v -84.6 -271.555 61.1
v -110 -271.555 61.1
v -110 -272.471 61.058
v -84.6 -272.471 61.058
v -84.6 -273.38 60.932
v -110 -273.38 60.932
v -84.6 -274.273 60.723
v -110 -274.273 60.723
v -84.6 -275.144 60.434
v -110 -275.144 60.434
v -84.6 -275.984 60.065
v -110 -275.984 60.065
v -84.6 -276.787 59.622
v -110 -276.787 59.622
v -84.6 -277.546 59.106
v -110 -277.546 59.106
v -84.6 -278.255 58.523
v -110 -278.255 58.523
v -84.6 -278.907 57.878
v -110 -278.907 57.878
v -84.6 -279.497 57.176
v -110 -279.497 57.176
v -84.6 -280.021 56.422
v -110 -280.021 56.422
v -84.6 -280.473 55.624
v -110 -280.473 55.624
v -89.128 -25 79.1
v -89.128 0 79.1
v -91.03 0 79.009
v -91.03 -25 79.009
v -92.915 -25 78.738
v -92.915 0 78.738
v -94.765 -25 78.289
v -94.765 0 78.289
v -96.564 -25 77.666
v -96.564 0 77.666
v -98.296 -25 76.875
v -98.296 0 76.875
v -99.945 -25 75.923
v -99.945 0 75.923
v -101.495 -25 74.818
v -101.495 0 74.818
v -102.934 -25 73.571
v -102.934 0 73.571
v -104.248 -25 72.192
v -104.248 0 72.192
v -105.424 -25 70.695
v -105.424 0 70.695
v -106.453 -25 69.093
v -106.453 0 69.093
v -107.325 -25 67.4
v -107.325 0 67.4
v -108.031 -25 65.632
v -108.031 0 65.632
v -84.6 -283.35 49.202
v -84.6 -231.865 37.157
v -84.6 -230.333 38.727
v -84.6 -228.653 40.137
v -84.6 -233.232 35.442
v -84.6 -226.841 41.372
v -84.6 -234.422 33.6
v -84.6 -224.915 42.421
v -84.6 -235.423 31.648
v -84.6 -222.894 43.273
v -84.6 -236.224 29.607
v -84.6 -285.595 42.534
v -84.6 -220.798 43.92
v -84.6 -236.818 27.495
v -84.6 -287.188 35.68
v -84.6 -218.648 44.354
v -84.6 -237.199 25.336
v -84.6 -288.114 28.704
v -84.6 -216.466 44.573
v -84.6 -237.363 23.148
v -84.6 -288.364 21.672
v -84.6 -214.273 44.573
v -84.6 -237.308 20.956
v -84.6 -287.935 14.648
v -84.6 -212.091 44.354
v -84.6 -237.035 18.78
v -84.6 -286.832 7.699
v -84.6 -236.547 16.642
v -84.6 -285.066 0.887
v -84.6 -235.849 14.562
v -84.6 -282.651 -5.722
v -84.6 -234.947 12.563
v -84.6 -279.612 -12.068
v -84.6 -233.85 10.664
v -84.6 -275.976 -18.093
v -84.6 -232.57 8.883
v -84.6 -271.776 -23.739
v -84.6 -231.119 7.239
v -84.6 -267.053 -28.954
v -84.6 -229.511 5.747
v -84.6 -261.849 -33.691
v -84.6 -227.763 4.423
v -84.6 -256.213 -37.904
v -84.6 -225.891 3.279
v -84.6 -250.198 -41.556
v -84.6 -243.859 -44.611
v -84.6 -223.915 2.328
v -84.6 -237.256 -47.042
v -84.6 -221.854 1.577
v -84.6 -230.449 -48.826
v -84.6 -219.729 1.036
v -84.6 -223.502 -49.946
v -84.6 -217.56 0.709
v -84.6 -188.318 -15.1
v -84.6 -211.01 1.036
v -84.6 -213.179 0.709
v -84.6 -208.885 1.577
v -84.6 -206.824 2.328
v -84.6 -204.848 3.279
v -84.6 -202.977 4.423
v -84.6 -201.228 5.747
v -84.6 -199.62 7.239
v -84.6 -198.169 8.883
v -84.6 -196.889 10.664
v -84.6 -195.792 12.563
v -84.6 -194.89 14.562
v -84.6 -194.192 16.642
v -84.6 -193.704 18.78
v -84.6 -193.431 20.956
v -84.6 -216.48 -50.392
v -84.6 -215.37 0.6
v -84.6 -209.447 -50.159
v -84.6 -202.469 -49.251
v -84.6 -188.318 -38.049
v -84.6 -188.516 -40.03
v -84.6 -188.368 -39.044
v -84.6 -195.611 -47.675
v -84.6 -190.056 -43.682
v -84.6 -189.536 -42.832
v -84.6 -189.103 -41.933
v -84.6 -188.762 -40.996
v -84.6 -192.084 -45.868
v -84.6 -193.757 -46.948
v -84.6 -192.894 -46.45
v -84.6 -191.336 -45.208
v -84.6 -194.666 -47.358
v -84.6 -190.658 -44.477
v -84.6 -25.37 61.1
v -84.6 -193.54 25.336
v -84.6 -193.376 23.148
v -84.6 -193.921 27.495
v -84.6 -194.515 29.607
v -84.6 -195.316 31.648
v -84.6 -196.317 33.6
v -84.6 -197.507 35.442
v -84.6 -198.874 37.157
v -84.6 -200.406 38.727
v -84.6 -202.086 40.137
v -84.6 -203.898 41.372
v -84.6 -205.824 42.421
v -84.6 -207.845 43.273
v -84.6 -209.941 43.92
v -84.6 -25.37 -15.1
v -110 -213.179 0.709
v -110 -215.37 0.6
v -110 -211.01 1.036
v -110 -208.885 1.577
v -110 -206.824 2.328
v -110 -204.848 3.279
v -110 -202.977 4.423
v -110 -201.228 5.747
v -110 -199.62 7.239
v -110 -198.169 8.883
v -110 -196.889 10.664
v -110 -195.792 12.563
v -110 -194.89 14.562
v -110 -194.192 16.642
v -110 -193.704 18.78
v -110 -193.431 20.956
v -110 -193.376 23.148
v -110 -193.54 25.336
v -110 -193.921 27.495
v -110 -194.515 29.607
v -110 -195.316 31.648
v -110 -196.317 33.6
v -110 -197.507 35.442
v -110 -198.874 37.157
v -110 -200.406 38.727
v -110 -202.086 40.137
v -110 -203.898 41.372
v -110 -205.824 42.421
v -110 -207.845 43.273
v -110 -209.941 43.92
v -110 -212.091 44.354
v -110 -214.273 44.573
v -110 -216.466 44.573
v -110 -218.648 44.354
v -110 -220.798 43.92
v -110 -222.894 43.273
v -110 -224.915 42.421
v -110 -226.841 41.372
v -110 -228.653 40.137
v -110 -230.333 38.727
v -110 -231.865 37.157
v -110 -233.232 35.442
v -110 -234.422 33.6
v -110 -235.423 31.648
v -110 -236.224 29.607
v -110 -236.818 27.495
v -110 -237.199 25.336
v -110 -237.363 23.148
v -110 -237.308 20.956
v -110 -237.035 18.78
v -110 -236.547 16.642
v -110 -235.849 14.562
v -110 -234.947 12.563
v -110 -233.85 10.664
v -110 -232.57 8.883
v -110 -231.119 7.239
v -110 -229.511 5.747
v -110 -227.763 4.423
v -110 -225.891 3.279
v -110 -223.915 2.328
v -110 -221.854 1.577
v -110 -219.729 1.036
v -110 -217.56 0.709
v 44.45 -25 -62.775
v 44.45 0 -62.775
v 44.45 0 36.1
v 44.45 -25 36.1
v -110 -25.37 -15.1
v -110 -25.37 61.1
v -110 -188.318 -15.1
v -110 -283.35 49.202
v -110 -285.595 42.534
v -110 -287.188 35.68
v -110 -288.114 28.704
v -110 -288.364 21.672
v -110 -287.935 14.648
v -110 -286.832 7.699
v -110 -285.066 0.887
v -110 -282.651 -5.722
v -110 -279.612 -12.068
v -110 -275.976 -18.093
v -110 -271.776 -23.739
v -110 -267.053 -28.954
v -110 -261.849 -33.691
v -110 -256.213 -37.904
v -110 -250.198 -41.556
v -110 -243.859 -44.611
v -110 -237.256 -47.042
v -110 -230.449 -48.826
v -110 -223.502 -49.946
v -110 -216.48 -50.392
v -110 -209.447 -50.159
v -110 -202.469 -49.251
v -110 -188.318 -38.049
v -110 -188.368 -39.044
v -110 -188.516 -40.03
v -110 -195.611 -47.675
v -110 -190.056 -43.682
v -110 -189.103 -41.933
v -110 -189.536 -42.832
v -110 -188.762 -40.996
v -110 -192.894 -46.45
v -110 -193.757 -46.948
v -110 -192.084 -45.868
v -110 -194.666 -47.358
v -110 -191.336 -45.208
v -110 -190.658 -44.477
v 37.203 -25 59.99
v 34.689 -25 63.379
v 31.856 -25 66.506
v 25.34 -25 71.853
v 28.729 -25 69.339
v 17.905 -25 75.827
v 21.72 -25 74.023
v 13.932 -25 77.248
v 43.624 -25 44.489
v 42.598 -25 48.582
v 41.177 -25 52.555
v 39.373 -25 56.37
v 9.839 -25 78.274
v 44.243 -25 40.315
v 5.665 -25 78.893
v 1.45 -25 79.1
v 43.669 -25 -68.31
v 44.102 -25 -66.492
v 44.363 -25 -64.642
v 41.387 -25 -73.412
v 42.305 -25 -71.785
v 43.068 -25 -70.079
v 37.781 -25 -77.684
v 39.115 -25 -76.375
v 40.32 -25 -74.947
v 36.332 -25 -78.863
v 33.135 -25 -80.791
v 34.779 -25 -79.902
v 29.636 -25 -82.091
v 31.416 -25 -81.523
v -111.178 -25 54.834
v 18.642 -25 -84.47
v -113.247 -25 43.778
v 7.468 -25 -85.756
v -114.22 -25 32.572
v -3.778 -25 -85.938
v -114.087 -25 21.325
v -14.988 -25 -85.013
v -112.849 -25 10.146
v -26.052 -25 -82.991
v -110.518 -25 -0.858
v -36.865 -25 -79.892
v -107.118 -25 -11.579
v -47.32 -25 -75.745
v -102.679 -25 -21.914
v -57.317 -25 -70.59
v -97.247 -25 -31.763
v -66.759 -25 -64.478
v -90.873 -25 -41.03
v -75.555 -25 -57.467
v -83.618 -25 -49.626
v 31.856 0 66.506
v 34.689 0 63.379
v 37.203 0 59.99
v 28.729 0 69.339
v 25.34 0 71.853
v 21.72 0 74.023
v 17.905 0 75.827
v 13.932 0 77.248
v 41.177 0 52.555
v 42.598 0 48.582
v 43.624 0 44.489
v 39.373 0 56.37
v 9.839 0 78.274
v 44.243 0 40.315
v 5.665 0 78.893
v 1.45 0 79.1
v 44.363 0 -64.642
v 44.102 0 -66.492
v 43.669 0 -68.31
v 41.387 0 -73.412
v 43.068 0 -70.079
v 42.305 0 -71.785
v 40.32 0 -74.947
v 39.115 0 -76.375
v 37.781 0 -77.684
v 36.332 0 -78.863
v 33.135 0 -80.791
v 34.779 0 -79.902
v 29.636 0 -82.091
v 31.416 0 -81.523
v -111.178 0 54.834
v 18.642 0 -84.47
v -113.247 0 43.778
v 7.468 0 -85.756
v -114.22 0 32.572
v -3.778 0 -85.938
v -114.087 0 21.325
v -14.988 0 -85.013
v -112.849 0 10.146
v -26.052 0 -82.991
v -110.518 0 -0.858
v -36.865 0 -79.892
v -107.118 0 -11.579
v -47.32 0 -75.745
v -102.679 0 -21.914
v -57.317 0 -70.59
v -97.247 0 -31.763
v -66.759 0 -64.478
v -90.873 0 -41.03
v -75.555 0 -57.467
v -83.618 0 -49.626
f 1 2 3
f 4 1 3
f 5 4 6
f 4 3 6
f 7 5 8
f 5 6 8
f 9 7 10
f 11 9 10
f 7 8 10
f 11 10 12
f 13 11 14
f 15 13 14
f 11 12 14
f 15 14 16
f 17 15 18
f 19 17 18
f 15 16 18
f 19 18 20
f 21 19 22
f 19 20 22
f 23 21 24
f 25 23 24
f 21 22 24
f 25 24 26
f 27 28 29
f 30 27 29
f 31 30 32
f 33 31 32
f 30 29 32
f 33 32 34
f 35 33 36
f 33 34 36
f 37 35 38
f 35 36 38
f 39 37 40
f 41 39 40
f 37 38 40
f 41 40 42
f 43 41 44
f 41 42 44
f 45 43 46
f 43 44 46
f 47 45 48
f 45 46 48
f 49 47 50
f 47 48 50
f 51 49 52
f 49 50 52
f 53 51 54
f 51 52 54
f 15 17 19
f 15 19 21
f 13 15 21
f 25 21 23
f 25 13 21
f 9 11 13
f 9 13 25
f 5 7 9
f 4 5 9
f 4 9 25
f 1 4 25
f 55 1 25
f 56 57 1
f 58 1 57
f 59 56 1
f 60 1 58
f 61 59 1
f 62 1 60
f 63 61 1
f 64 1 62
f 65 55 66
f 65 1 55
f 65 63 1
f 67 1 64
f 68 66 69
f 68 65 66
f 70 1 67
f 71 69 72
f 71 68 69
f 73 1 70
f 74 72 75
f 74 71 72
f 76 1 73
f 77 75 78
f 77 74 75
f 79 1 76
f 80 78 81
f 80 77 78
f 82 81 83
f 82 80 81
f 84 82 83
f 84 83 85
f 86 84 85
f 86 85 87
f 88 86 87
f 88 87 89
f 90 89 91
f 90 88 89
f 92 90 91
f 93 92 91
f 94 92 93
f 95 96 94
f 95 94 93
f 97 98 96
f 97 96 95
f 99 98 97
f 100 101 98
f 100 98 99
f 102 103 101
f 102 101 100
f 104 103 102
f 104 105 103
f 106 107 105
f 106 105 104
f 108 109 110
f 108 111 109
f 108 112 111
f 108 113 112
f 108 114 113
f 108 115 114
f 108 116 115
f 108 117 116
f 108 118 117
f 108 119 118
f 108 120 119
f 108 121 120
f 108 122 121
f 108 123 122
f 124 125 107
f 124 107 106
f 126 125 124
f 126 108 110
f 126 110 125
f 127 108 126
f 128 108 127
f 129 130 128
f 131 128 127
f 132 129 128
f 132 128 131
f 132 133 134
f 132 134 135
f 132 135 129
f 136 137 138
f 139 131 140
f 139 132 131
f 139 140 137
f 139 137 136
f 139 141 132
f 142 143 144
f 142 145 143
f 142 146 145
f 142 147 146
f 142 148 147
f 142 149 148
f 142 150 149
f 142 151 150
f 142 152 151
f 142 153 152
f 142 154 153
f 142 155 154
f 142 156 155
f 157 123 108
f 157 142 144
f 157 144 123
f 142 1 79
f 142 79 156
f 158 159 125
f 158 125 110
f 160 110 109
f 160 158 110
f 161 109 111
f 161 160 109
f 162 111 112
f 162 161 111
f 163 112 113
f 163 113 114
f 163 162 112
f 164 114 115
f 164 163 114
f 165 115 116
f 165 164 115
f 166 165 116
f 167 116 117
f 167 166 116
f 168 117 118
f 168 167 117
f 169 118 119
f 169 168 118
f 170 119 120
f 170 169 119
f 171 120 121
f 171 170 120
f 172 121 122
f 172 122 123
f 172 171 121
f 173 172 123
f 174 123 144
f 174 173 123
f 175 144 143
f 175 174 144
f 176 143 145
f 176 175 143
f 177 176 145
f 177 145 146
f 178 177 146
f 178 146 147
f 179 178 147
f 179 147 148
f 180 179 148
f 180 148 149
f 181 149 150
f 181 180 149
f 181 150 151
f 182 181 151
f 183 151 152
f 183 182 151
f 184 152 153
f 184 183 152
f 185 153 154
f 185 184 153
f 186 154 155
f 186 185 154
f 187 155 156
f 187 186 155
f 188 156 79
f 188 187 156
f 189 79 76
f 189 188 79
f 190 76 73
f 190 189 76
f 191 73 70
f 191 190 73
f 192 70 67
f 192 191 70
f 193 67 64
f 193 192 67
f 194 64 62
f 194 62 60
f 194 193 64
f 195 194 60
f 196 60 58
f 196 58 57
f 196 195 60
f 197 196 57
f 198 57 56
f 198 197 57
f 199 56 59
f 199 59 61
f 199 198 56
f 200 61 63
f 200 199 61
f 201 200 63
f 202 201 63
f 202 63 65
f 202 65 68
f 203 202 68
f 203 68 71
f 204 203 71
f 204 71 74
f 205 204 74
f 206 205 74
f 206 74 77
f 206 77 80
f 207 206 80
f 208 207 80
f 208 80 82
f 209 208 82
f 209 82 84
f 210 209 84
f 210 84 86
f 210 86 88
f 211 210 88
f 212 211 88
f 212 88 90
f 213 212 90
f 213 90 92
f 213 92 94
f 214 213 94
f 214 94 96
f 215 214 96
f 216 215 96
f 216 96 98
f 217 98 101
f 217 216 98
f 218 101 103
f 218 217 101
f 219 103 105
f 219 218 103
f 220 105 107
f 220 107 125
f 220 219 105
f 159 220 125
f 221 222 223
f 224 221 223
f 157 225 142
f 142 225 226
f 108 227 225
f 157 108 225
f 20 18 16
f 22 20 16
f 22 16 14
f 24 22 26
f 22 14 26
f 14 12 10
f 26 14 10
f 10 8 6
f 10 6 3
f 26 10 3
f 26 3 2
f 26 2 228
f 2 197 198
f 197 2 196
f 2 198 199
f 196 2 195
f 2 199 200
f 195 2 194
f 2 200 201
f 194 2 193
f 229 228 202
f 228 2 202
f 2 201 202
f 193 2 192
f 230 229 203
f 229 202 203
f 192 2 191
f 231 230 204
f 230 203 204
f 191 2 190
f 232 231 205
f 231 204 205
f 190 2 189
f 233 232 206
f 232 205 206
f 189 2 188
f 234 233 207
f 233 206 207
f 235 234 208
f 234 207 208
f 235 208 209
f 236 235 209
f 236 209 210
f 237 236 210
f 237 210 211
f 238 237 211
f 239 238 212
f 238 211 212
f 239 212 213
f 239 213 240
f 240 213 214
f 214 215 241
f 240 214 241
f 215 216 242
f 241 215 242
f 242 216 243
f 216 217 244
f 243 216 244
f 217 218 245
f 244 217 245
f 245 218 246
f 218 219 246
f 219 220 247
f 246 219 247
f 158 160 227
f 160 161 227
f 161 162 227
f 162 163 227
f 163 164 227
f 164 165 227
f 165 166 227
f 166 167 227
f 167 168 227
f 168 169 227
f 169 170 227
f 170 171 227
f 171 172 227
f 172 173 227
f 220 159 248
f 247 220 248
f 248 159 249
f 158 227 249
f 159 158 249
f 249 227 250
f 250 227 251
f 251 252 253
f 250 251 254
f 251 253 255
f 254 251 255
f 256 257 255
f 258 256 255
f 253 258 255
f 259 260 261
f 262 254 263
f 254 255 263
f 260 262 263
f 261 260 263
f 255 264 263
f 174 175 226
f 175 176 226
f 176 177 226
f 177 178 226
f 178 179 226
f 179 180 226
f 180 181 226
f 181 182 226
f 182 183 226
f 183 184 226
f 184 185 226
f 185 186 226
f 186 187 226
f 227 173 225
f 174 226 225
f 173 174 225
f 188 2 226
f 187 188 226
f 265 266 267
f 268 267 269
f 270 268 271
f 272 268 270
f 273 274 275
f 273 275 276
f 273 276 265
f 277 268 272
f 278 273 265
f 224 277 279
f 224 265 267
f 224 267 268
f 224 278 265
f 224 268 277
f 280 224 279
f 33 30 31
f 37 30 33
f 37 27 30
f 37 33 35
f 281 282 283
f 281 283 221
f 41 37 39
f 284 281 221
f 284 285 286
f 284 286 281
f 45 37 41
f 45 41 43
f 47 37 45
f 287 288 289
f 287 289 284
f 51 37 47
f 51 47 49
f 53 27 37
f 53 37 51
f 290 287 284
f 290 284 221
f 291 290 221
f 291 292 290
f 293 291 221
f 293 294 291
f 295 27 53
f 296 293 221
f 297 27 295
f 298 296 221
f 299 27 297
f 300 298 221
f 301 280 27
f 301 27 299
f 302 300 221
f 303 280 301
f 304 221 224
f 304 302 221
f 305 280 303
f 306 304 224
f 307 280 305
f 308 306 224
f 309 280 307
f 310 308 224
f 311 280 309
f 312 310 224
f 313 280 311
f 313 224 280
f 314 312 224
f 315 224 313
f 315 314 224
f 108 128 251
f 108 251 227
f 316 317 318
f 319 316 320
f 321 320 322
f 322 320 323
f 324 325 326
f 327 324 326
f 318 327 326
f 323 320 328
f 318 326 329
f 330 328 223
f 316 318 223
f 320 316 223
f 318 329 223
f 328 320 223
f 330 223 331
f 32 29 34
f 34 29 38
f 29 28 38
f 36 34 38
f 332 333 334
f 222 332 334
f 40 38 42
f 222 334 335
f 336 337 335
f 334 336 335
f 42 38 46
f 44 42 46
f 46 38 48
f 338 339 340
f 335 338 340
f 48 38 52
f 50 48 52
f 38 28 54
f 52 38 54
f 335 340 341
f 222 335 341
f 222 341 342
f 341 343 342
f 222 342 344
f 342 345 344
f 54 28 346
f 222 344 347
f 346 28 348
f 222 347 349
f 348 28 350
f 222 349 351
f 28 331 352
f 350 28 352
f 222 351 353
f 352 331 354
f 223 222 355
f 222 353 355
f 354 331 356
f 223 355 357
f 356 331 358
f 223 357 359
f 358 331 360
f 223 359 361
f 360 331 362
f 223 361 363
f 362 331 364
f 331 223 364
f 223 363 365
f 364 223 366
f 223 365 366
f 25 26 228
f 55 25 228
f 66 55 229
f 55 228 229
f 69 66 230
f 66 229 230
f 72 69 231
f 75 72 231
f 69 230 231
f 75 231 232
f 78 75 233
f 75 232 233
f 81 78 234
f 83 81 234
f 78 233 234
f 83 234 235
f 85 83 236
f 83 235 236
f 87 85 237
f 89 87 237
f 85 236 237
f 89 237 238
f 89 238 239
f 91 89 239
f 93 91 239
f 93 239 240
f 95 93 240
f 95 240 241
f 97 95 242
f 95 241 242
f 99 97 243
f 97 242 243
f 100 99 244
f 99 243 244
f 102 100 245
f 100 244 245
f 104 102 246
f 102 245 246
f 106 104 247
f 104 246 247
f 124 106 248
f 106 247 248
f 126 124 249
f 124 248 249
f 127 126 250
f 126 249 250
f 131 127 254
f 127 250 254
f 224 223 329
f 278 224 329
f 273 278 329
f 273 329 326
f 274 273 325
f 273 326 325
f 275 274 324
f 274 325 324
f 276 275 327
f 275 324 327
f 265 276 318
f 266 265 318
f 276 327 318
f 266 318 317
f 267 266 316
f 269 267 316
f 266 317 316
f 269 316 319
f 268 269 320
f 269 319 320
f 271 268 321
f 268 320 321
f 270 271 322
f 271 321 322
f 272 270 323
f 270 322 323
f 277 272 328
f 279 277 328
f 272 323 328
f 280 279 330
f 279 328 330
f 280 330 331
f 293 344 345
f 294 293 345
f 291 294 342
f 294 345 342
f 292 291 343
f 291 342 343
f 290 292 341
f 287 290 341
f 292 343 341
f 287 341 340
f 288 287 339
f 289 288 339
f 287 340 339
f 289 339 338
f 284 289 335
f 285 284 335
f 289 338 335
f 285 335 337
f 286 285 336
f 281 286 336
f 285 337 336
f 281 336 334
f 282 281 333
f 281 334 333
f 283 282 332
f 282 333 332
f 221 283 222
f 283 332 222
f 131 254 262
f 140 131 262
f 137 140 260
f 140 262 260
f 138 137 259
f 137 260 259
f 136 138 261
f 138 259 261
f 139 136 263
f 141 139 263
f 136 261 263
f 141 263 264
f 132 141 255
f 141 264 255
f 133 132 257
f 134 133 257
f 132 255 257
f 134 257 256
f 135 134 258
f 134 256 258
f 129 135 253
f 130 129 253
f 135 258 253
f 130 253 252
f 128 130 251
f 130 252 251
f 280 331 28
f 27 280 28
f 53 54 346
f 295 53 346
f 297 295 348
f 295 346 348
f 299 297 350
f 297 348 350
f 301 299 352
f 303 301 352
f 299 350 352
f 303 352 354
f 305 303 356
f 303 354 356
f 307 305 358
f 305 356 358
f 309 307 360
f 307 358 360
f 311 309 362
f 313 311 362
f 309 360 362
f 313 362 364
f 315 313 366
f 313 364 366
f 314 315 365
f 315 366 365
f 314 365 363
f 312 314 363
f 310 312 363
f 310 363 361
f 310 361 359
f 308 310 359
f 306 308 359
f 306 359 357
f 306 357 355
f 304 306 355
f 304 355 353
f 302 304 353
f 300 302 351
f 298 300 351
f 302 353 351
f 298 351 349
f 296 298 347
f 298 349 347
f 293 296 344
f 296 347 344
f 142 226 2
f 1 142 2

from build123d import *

# Parameters (mm, degrees)
BOSS_EXTRUDE2_DEPTH = 25
SKETCH2_R           = 22
BOSS_EXTRUDE5_DEPTH = 25.4


with BuildPart() as part:
    # Sketch1 → Boss-Extrude2 (new body)
    with BuildSketch(Plane(origin=(0, 0, 0), x_dir=(1, 0, 0), z_dir=(0, 1, 0))):
        with BuildLine():
            Line((44.45, 62.775174993), (44.45, -36.1))
            ThreePointArc((44.45, -36.1), (31.855591591, -66.505591591), (1.45, -79.1))
            Line((1.45, -79.1), (-89.128278341, -79.1))
            ThreePointArc((-89.128278341, -79.1), (-100.73330157, -75.38875182), (-108.031412665, -65.632343584))
            ThreePointArc((-108.031412665, -65.632343584), (-83.618418377, 49.62592706), (29.635577943, 82.091224832))
            ThreePointArc((29.635577943, 82.091224832), (40.319964695, 74.946626039), (44.45, 62.775174993))
        make_face()
    extrude(amount=-BOSS_EXTRUDE2_DEPTH)


with BuildPart() as body_2:
    # Sketch2 → Boss-Extrude5 (new body)
    with BuildSketch(Plane(origin=(-110, 0, 0), x_dir=(0, 0, -1), z_dir=(1, 0, 0))):
        with BuildLine():
            Line((-61.1, -215.369552032), (-61.1, -271.554514433))
            ThreePointArc((-61.1, -271.554514433), (-59.621681032, -276.787195618), (-55.623809524, -280.472762433))
            ThreePointArc((-55.623809524, -280.472762433), (23.738762296, -271.776281319), (47.675282365, -195.611397044))
            ThreePointArc((47.675282365, -195.611397044), (44.087324044, -190.347235632), (38.048531356, -188.317993618))
            Line((38.048531356, -188.317993618), (15.1, -188.317993618))
            Line((15.1, -188.317993618), (15.1, -25.369552032))
            Line((15.1, -25.369552032), (-61.1, -25.369552032))
            Line((-61.1, -25.369552032), (-61.1, -215.369552032))
        make_face()
        with Locations((-22.6, -215.369552032)):
            Circle(SKETCH2_R, mode=Mode.SUBTRACT)
    extrude(amount=BOSS_EXTRUDE5_DEPTH)


solid = Compound([part.part, body_2.part])
